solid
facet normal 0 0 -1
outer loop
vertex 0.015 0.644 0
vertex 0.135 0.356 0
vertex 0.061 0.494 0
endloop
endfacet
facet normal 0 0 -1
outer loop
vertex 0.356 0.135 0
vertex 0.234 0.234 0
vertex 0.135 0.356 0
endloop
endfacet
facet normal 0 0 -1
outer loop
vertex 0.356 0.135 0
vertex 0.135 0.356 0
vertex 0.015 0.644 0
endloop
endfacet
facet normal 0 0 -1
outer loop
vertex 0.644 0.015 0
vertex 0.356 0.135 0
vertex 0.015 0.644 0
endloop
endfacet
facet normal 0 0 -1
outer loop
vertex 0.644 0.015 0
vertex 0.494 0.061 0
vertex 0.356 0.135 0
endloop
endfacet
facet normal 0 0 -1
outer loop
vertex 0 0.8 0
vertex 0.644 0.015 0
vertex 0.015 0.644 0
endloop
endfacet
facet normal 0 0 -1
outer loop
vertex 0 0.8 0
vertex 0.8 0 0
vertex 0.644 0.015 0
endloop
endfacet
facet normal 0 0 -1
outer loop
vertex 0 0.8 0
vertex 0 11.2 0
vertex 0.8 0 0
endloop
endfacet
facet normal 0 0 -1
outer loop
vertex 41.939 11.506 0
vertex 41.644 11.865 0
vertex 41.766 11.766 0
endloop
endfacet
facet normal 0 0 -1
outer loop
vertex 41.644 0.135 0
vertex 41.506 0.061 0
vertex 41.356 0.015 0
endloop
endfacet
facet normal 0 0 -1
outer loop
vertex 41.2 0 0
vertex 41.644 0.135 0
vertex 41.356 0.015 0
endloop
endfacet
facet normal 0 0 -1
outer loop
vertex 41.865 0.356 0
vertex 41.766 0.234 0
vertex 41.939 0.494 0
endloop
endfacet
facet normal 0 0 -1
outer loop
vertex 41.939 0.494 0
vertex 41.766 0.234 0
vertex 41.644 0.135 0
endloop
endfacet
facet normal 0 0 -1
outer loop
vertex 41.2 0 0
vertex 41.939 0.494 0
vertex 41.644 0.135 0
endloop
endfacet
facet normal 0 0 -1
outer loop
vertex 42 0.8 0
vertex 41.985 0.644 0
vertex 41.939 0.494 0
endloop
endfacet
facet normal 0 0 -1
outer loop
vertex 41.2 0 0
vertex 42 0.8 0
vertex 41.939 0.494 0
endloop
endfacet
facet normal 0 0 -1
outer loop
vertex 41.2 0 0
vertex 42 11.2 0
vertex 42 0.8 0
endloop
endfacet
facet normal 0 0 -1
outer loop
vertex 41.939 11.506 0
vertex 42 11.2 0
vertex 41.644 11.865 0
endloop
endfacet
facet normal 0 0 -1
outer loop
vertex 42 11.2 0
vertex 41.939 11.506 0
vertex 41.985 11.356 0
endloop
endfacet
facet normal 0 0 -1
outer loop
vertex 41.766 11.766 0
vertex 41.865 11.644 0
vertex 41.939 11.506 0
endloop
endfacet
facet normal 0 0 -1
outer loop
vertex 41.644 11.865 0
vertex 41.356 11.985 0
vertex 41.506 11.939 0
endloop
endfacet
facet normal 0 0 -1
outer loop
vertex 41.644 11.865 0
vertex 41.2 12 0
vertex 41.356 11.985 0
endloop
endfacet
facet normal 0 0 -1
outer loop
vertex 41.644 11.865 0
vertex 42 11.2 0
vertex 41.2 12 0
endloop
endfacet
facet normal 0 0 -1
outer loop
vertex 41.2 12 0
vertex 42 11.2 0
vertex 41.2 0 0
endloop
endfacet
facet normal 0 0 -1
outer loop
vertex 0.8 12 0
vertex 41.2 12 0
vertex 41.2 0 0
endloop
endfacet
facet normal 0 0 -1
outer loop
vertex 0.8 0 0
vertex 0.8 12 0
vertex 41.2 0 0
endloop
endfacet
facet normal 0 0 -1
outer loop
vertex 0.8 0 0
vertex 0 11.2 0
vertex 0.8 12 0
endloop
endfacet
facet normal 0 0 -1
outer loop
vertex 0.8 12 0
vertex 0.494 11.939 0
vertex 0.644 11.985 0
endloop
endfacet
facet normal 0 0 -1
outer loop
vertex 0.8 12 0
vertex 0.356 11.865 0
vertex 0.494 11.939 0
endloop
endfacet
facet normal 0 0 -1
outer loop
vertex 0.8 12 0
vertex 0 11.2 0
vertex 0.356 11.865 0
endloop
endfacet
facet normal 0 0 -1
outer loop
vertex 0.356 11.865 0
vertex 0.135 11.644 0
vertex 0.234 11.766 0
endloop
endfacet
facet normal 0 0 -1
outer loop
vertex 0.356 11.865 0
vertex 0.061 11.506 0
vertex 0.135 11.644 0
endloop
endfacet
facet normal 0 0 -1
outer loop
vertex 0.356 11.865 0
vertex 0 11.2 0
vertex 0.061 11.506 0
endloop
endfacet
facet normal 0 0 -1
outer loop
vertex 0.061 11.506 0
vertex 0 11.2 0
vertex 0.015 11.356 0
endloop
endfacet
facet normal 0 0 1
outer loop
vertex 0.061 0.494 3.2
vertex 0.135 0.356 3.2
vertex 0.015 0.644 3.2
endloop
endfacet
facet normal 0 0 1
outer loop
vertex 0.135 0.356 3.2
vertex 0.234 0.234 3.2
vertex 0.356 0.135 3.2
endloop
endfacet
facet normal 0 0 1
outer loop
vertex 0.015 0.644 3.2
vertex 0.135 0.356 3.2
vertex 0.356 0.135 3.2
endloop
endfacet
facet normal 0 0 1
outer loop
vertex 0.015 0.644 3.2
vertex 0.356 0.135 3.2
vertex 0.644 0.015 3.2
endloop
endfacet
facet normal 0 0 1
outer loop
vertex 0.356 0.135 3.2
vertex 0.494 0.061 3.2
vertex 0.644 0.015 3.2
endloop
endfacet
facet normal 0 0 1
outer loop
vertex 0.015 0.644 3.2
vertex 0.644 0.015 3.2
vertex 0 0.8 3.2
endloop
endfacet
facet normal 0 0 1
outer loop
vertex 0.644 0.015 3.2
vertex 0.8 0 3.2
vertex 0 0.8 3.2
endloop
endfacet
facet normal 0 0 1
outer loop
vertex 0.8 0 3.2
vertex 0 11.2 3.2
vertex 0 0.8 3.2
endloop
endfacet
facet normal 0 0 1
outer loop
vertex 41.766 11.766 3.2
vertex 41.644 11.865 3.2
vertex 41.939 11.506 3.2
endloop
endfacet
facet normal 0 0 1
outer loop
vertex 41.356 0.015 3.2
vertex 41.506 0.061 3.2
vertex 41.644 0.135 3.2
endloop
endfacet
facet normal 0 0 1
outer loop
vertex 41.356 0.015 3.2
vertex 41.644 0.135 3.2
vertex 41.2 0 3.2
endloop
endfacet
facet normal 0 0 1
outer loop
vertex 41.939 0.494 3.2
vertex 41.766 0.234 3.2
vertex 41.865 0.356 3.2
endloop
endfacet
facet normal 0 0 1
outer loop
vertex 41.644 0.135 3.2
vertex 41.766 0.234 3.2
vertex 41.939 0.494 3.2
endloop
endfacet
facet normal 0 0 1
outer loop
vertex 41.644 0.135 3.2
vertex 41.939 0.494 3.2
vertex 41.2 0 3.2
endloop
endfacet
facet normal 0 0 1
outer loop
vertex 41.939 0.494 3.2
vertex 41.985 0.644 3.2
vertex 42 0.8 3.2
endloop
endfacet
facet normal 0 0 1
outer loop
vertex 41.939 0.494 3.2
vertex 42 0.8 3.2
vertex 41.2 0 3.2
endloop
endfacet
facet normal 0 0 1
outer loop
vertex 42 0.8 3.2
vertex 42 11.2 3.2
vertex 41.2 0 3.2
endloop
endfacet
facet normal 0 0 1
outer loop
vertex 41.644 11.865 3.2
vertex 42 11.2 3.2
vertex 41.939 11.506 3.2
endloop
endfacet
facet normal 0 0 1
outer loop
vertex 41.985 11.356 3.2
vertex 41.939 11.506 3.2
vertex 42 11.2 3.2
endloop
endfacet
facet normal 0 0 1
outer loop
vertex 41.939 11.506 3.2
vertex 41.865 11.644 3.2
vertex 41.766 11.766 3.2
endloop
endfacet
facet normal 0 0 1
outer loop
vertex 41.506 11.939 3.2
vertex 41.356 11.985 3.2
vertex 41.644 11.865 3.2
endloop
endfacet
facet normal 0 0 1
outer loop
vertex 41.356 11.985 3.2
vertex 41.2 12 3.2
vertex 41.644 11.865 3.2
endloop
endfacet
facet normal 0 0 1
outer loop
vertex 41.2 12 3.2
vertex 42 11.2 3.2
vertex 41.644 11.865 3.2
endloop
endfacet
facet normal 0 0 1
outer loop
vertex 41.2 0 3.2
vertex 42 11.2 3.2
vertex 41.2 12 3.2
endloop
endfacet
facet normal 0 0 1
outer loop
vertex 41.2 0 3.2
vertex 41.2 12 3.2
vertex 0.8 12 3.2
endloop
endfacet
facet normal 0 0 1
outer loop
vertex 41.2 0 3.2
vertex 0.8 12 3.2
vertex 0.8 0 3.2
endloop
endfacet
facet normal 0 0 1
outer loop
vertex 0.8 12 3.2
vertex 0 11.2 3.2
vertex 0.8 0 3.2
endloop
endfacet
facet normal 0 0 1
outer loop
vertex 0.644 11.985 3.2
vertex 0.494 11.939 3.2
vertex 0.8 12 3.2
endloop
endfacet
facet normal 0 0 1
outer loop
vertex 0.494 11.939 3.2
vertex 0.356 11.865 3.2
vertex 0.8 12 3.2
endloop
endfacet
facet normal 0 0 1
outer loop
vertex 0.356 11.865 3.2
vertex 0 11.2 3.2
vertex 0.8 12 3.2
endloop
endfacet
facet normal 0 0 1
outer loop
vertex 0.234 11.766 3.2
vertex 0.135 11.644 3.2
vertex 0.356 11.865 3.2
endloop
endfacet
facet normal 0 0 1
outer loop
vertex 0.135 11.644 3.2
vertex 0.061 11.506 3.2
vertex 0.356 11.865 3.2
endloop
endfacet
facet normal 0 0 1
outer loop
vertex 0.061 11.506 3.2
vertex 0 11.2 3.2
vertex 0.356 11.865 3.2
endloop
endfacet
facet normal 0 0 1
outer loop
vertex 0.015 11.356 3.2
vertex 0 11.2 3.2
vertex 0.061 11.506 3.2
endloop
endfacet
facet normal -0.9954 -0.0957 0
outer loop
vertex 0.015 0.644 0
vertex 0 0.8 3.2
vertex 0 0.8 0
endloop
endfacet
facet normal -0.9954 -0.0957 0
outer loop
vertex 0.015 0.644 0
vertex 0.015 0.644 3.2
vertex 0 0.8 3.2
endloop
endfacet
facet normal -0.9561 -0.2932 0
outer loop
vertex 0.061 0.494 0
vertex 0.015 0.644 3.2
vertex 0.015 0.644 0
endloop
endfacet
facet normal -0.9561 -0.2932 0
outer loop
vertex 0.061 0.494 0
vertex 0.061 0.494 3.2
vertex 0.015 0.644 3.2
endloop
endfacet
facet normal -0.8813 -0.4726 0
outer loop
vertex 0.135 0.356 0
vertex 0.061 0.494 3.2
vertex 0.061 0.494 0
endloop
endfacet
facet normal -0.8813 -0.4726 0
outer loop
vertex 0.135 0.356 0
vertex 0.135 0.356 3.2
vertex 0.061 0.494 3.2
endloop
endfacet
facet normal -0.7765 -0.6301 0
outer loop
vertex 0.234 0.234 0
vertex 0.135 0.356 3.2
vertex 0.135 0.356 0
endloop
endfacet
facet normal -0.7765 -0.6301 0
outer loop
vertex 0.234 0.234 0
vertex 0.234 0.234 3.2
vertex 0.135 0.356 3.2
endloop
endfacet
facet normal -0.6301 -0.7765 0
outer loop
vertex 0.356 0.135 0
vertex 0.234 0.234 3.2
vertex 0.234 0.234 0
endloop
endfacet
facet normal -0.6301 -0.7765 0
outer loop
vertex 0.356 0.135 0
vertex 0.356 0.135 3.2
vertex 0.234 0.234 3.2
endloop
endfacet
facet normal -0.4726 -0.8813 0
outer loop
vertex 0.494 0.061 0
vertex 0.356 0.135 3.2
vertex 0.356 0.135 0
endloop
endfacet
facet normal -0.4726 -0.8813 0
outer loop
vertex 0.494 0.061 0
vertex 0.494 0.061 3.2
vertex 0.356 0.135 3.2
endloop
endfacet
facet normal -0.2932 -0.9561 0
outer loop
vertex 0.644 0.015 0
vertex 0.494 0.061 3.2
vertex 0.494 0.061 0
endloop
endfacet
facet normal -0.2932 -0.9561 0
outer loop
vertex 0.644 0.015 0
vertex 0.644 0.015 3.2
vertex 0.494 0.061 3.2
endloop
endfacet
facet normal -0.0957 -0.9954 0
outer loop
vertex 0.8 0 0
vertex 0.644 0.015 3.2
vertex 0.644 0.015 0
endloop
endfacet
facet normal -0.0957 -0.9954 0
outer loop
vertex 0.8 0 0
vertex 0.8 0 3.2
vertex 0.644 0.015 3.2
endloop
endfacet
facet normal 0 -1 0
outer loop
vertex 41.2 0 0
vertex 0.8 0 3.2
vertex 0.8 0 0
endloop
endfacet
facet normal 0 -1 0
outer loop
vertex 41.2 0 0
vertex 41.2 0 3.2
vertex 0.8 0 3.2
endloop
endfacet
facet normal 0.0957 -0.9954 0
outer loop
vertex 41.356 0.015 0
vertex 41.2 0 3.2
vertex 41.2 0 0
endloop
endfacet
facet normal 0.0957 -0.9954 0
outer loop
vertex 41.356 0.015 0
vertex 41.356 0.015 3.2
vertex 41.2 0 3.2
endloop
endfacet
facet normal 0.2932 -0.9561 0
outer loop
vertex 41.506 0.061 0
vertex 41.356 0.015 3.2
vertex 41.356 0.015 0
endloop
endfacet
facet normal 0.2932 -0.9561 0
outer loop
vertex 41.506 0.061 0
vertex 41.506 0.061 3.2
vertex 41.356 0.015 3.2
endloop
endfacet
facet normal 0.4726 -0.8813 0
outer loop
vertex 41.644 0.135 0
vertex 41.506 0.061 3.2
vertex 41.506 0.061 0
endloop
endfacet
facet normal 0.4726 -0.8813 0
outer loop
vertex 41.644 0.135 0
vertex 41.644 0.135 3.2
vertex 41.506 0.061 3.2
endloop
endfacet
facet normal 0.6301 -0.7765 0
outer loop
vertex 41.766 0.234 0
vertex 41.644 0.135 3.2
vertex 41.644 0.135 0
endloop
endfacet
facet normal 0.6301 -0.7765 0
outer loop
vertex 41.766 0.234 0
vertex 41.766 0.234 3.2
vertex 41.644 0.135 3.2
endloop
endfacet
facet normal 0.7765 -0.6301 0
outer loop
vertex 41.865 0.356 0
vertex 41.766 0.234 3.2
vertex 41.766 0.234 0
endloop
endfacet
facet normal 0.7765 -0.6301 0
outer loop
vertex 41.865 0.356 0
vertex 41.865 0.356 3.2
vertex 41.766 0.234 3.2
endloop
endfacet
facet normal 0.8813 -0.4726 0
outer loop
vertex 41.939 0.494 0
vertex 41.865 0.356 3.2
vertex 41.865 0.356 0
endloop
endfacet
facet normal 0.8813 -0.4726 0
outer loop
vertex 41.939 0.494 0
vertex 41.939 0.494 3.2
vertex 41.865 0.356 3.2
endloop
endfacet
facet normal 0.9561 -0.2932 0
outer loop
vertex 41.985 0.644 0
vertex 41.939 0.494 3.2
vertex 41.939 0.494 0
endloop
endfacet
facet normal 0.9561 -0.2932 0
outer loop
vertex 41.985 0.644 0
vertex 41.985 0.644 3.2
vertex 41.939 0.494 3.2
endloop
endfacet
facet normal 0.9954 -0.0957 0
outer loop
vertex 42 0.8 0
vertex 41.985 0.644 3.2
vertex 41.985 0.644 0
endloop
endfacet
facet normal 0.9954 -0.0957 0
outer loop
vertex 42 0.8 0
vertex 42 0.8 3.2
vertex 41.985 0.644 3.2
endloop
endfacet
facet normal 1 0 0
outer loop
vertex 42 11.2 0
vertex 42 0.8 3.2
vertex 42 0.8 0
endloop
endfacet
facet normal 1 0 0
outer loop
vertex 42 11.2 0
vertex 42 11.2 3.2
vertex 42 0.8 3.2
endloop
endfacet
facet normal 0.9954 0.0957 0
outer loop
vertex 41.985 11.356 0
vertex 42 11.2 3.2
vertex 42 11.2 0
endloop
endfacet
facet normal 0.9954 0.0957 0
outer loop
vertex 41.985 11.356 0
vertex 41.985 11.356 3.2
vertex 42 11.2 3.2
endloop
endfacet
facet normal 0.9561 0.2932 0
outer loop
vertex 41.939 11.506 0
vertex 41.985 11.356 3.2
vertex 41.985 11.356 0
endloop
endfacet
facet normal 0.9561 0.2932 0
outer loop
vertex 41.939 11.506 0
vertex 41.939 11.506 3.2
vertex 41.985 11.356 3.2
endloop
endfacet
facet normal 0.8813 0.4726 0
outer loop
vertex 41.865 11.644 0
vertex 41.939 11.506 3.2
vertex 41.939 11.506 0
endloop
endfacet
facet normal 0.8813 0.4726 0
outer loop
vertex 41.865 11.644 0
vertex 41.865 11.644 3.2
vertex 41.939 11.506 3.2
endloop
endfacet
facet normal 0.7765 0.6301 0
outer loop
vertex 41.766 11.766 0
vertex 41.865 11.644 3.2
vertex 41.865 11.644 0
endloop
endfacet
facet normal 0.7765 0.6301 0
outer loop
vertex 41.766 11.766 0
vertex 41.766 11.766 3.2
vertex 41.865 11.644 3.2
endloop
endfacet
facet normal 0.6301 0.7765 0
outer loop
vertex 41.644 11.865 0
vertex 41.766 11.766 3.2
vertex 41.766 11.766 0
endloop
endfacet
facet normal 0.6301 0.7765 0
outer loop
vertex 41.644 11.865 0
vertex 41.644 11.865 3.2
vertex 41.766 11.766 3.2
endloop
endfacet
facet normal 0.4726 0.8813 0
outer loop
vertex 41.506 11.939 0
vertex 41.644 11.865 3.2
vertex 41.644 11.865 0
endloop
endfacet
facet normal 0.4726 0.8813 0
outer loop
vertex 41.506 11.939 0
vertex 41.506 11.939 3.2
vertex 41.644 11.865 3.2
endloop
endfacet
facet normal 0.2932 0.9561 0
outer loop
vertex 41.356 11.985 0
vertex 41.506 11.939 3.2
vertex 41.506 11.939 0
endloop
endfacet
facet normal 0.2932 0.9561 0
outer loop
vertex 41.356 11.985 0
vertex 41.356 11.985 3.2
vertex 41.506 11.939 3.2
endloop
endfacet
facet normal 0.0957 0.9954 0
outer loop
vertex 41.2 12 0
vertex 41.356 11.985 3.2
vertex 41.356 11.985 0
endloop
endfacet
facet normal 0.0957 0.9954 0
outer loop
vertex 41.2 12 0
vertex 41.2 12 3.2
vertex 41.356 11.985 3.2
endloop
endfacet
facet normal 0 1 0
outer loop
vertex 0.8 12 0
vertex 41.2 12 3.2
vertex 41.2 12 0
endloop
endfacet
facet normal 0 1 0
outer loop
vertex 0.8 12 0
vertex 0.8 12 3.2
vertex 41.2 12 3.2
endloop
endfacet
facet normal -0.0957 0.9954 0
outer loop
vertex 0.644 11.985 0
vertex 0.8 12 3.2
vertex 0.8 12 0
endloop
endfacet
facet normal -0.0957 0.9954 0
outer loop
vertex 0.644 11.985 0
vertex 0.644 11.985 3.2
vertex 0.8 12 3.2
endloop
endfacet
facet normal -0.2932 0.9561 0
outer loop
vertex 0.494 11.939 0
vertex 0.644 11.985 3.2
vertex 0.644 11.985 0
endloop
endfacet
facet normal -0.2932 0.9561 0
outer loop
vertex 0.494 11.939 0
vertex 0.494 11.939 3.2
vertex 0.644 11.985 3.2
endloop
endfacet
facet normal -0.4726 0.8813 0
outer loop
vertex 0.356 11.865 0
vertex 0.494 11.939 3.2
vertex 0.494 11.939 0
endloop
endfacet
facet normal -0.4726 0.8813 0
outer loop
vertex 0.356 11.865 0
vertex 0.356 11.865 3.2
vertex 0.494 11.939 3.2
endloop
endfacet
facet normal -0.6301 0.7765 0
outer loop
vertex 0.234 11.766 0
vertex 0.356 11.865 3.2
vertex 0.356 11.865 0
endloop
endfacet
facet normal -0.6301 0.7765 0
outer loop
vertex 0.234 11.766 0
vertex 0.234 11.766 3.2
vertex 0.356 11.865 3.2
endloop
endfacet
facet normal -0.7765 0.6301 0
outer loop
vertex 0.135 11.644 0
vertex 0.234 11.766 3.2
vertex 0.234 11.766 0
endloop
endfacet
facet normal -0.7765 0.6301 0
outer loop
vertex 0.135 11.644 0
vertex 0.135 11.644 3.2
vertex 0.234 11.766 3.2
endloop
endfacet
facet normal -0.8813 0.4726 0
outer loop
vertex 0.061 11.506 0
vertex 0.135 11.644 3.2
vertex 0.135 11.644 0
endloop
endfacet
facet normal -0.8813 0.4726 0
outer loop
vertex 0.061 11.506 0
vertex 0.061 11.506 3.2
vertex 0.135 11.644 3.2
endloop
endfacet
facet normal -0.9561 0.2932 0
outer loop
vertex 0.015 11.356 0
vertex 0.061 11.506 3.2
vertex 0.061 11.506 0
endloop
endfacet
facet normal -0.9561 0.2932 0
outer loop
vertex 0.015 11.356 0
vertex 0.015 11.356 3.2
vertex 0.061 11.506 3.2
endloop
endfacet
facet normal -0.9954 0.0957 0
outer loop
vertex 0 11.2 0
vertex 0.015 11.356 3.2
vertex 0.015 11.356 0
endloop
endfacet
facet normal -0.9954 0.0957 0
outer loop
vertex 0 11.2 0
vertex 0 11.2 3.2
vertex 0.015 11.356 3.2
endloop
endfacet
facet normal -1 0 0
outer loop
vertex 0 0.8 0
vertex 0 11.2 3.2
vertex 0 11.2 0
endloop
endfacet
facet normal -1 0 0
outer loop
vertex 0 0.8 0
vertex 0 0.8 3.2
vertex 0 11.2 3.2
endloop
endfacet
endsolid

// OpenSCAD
/*
Loose seam alignment key.
Print orientation: print flat.
Quantity: print extras; keys bridge matching recesses across neighboring tile seams.
*/

use <../planter_support_free.scad>

export_seam_key();
